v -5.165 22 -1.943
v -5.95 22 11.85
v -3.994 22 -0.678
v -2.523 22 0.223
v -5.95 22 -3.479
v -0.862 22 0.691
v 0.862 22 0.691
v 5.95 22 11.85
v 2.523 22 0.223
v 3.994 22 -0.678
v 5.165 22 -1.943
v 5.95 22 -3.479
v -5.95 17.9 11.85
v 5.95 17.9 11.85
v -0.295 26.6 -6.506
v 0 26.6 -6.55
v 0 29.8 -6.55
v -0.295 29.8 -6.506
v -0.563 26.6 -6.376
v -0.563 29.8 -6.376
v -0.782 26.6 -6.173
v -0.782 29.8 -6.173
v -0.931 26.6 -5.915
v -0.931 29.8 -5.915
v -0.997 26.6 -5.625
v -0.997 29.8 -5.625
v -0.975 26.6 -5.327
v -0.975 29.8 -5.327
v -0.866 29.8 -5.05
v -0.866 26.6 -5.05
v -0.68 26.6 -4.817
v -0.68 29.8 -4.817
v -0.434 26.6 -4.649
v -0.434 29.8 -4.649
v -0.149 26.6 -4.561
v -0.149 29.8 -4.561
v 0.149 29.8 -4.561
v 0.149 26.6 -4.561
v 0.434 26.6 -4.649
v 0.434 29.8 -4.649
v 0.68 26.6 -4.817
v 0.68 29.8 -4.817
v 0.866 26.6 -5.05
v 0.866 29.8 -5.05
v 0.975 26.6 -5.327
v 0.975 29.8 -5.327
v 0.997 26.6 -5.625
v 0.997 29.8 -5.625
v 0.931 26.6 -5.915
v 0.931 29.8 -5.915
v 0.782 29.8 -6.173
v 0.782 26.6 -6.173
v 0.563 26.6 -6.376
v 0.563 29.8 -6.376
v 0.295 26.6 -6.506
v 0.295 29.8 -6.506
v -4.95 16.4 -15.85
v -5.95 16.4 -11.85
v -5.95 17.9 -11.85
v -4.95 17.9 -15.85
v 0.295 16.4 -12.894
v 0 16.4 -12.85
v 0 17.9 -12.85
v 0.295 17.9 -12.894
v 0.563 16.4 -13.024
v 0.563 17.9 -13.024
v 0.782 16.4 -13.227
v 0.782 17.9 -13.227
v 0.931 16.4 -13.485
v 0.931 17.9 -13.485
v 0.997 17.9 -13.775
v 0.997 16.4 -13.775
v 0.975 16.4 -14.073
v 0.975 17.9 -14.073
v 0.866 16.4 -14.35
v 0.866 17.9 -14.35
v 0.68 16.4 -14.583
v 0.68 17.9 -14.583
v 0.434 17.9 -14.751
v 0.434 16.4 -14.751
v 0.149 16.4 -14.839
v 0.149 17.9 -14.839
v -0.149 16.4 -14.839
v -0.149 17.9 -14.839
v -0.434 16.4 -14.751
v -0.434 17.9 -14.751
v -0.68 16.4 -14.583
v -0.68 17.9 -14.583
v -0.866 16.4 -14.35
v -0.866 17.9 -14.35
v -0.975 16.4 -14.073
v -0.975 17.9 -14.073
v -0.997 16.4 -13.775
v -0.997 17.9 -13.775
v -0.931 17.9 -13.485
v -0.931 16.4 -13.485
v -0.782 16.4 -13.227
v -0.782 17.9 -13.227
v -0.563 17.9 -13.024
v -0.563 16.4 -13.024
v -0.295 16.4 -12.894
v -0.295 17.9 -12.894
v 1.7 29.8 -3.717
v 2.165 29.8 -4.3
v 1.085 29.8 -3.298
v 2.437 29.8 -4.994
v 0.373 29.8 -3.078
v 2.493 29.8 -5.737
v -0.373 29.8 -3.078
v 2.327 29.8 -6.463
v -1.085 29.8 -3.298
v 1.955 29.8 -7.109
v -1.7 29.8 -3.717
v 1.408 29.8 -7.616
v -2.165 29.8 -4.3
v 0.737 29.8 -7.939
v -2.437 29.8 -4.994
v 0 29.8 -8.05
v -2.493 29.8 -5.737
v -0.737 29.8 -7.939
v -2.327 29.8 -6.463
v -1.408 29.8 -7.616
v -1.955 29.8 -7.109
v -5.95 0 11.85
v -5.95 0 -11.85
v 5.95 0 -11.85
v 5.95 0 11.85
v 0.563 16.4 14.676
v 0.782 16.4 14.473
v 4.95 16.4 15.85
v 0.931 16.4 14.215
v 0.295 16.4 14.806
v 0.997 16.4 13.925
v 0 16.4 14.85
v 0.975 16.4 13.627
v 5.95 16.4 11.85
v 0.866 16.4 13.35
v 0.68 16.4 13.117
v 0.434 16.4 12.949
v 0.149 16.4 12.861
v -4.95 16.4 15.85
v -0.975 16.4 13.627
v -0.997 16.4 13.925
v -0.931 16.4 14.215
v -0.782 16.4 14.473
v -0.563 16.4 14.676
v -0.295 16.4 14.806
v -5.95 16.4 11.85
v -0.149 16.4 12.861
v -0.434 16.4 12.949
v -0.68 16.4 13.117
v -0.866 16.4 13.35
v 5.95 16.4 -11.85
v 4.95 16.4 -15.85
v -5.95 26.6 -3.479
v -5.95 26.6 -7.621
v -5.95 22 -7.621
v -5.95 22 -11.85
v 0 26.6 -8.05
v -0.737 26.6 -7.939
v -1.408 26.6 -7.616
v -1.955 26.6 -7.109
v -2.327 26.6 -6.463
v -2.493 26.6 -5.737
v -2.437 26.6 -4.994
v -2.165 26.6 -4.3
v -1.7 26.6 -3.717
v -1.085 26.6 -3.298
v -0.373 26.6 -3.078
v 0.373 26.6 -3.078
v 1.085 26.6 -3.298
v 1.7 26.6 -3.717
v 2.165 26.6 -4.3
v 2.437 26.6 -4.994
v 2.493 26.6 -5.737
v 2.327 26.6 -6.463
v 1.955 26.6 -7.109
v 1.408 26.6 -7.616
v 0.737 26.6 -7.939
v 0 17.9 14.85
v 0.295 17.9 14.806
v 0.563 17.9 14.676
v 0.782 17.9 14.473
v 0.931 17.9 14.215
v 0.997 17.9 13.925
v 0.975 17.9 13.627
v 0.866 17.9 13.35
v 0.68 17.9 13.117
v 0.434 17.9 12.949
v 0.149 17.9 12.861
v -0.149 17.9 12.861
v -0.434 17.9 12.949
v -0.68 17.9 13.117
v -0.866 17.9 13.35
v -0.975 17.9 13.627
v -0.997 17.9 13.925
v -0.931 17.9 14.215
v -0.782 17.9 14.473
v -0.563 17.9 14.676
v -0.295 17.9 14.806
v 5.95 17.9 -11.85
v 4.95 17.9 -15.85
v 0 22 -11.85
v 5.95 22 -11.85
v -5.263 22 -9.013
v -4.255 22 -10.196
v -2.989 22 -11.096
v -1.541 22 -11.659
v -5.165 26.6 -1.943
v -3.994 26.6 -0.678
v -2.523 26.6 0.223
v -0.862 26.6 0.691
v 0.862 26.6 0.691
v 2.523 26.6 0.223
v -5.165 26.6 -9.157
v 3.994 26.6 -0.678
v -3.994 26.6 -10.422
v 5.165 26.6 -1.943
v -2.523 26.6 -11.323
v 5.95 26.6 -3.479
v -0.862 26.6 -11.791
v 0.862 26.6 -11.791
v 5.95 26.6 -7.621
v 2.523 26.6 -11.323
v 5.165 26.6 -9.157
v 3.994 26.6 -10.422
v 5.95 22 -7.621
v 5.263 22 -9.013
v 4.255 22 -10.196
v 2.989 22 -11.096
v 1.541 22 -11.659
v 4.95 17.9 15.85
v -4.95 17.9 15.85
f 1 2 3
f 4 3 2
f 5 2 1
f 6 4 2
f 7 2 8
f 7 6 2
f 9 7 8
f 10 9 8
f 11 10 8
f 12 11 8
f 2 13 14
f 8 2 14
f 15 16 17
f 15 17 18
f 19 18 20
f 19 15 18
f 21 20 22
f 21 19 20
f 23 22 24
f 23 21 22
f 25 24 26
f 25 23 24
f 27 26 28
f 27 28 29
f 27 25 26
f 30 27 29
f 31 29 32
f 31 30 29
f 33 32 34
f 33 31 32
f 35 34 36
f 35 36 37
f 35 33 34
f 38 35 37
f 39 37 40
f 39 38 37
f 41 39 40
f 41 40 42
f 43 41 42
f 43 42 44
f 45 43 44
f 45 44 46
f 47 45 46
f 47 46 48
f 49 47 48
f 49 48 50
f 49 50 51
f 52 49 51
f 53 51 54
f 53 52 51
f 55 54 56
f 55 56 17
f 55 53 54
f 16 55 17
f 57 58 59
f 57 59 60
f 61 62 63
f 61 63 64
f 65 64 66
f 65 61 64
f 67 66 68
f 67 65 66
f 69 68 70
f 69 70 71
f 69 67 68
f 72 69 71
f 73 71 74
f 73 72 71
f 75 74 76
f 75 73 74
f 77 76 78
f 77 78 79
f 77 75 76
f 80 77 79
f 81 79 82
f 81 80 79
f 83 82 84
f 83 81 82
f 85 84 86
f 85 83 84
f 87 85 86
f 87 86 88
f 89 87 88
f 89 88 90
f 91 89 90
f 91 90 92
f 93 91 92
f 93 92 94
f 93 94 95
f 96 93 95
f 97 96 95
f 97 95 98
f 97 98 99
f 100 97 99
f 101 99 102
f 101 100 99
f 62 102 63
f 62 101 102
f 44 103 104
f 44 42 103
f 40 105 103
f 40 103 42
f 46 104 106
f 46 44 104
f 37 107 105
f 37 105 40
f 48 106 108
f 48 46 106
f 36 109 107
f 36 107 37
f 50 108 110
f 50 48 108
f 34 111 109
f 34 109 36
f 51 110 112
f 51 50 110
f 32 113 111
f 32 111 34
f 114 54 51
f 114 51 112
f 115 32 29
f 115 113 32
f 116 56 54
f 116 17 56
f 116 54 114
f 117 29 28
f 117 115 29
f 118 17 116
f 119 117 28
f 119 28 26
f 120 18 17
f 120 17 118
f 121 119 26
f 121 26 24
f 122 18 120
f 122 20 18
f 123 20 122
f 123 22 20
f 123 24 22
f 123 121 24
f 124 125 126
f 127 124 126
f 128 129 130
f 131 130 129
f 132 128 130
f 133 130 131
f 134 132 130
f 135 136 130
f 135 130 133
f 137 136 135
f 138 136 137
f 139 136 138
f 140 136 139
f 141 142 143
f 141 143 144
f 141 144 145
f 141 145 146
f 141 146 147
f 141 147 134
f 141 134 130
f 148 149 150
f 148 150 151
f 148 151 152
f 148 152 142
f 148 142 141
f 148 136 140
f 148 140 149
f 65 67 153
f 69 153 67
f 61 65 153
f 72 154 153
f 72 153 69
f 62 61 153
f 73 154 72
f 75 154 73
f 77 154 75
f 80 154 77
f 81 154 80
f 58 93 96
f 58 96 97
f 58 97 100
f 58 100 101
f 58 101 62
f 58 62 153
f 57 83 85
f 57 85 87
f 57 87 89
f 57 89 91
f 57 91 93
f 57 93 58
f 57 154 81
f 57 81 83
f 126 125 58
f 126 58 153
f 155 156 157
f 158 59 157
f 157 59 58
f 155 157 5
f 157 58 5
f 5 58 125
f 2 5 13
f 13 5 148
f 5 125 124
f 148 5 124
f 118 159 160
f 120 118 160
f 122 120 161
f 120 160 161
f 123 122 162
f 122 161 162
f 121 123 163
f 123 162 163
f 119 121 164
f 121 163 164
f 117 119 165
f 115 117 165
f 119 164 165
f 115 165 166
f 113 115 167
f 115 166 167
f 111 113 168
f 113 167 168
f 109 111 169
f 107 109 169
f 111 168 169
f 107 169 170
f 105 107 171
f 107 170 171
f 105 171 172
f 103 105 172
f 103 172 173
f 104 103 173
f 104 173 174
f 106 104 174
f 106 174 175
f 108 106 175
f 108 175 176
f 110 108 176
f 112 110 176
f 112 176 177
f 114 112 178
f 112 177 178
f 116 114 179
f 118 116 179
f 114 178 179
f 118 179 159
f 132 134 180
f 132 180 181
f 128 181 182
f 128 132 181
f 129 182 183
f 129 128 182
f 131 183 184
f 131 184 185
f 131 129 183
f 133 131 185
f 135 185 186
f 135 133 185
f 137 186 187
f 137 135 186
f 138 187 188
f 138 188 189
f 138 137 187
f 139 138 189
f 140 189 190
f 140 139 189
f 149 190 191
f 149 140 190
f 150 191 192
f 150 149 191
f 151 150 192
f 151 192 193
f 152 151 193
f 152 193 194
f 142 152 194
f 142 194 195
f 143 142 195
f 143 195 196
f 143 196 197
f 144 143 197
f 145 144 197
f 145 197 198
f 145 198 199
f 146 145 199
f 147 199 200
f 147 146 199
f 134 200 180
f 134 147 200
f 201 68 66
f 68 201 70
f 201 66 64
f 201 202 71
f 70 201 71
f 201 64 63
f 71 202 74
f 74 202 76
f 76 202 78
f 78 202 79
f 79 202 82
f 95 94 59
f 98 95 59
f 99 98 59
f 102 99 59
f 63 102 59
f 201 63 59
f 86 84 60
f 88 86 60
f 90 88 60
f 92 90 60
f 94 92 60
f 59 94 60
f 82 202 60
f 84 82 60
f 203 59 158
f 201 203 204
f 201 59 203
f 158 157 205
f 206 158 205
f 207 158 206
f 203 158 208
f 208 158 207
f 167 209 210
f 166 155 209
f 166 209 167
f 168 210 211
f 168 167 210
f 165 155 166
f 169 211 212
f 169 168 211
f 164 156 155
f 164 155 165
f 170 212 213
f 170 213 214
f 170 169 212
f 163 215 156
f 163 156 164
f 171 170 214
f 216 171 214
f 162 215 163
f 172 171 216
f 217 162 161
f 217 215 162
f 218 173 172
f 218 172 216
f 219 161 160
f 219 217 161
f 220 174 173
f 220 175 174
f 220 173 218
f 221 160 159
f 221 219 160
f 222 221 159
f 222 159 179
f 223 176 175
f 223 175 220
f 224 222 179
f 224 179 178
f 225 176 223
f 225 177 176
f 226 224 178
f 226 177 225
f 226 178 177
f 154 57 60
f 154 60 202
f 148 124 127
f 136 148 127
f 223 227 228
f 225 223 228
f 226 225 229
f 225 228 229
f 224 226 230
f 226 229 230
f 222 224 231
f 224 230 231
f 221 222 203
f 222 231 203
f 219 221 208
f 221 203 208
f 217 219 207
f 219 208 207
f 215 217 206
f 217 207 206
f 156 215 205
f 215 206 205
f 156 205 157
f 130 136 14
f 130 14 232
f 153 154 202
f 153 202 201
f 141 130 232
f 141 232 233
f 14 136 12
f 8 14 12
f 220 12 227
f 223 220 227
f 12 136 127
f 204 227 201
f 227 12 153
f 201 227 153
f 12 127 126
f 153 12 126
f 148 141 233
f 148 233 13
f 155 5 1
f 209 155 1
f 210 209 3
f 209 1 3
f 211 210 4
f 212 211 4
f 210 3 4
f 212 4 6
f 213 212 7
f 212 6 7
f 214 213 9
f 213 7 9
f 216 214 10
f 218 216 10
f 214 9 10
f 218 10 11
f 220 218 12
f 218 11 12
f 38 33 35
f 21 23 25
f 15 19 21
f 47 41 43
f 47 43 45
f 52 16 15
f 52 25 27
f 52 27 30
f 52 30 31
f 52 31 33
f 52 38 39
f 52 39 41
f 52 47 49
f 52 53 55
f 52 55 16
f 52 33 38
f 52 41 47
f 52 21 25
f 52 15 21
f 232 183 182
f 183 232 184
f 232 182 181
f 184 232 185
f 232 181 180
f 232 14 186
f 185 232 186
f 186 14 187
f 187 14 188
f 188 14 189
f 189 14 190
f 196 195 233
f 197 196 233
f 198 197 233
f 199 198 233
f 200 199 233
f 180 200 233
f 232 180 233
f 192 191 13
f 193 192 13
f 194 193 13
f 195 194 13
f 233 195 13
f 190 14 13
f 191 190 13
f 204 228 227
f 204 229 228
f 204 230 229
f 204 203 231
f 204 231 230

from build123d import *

# Parameters (mm, degrees)
SKETCH_1_W      = 11.9
SKETCH_1_H      = 23.7
EXTRUDE_1_DEPTH = 16.4
SKETCH_2_R      = 1
EXTRUDE_2_DEPTH = 1.5
SKETCH_3_W      = 11.9
SKETCH_3_H      = 23.7
EXTRUDE_3_DEPTH = 4.1
EXTRUDE_4_DEPTH = 4.6
SKETCH_5_R      = 2.5
SKETCH_5_R_2    = 1
EXTRUDE_5_DEPTH = 3.2


with BuildPart() as part:
    # 草图1 → 凸台-拉伸1 (new body)
    with BuildSketch(Plane(origin=(0, 0, 0), x_dir=(1, 0, 0), z_dir=(0, 1, 0))):
        Rectangle(SKETCH_1_W, SKETCH_1_H)
    extrude(amount=EXTRUDE_1_DEPTH)

    # 草图2 → 凸台-拉伸2 (add)
    with BuildSketch(Plane(origin=(0, 16.4, 0), x_dir=(1, 0, 0), z_dir=(0, 1, 0))):
        Polygon((-5.95, 11.85), (-4.95, 15.85), (4.95, 15.85), (5.95, 11.85), (5.95, -11.85), (4.95, -15.85), (-4.95, -15.85), (-5.95, -11.85), align=None)
        with Locations(Location((0, 13.85, 0), (0, 0, 270))):
            Circle(SKETCH_2_R, mode=Mode.SUBTRACT)
        with Locations(Location((0, -13.85, 0), (0, 0, 270))):
            Circle(SKETCH_2_R, mode=Mode.SUBTRACT)
    extrude(amount=EXTRUDE_2_DEPTH)

    # 草图3 → 凸台-拉伸3 (add)
    with BuildSketch(Plane(origin=(0, 17.9, 0), x_dir=(1, 0, 0), z_dir=(0, 1, 0))):
        Rectangle(SKETCH_3_W, SKETCH_3_H)
    extrude(amount=EXTRUDE_3_DEPTH)

    # 草图4 → 凸台-拉伸4 (add)
    with BuildSketch(Plane(origin=(0, 22, 0), x_dir=(1, 0, 0), z_dir=(0, 1, 0))):
        with BuildLine():
            Line((-5.95, 7.620627924), (-5.95, 3.479372076))
            ThreePointArc((-5.95, 3.479372076), (0, -0.75), (5.95, 3.479372076))
            Line((5.95, 3.479372076), (5.95, 7.620627924))
            ThreePointArc((5.95, 7.620627924), (0, 11.85), (-5.95, 7.620627924))
        make_face()
    extrude(amount=EXTRUDE_4_DEPTH)

    # 草图5 → 凸台-拉伸5 (add)
    with BuildSketch(Plane(origin=(0, 26.6, 0), x_dir=(1, 0, 0), z_dir=(0, 1, 0))):
        with Locations(Location((0, 5.55, 0), (0, 0, 90))):
            Circle(SKETCH_5_R)
        with Locations(Location((0, 5.55, 0), (0, 0, 90))):
            Circle(SKETCH_5_R_2, mode=Mode.SUBTRACT)
    extrude(amount=EXTRUDE_5_DEPTH)


solid = part.part
